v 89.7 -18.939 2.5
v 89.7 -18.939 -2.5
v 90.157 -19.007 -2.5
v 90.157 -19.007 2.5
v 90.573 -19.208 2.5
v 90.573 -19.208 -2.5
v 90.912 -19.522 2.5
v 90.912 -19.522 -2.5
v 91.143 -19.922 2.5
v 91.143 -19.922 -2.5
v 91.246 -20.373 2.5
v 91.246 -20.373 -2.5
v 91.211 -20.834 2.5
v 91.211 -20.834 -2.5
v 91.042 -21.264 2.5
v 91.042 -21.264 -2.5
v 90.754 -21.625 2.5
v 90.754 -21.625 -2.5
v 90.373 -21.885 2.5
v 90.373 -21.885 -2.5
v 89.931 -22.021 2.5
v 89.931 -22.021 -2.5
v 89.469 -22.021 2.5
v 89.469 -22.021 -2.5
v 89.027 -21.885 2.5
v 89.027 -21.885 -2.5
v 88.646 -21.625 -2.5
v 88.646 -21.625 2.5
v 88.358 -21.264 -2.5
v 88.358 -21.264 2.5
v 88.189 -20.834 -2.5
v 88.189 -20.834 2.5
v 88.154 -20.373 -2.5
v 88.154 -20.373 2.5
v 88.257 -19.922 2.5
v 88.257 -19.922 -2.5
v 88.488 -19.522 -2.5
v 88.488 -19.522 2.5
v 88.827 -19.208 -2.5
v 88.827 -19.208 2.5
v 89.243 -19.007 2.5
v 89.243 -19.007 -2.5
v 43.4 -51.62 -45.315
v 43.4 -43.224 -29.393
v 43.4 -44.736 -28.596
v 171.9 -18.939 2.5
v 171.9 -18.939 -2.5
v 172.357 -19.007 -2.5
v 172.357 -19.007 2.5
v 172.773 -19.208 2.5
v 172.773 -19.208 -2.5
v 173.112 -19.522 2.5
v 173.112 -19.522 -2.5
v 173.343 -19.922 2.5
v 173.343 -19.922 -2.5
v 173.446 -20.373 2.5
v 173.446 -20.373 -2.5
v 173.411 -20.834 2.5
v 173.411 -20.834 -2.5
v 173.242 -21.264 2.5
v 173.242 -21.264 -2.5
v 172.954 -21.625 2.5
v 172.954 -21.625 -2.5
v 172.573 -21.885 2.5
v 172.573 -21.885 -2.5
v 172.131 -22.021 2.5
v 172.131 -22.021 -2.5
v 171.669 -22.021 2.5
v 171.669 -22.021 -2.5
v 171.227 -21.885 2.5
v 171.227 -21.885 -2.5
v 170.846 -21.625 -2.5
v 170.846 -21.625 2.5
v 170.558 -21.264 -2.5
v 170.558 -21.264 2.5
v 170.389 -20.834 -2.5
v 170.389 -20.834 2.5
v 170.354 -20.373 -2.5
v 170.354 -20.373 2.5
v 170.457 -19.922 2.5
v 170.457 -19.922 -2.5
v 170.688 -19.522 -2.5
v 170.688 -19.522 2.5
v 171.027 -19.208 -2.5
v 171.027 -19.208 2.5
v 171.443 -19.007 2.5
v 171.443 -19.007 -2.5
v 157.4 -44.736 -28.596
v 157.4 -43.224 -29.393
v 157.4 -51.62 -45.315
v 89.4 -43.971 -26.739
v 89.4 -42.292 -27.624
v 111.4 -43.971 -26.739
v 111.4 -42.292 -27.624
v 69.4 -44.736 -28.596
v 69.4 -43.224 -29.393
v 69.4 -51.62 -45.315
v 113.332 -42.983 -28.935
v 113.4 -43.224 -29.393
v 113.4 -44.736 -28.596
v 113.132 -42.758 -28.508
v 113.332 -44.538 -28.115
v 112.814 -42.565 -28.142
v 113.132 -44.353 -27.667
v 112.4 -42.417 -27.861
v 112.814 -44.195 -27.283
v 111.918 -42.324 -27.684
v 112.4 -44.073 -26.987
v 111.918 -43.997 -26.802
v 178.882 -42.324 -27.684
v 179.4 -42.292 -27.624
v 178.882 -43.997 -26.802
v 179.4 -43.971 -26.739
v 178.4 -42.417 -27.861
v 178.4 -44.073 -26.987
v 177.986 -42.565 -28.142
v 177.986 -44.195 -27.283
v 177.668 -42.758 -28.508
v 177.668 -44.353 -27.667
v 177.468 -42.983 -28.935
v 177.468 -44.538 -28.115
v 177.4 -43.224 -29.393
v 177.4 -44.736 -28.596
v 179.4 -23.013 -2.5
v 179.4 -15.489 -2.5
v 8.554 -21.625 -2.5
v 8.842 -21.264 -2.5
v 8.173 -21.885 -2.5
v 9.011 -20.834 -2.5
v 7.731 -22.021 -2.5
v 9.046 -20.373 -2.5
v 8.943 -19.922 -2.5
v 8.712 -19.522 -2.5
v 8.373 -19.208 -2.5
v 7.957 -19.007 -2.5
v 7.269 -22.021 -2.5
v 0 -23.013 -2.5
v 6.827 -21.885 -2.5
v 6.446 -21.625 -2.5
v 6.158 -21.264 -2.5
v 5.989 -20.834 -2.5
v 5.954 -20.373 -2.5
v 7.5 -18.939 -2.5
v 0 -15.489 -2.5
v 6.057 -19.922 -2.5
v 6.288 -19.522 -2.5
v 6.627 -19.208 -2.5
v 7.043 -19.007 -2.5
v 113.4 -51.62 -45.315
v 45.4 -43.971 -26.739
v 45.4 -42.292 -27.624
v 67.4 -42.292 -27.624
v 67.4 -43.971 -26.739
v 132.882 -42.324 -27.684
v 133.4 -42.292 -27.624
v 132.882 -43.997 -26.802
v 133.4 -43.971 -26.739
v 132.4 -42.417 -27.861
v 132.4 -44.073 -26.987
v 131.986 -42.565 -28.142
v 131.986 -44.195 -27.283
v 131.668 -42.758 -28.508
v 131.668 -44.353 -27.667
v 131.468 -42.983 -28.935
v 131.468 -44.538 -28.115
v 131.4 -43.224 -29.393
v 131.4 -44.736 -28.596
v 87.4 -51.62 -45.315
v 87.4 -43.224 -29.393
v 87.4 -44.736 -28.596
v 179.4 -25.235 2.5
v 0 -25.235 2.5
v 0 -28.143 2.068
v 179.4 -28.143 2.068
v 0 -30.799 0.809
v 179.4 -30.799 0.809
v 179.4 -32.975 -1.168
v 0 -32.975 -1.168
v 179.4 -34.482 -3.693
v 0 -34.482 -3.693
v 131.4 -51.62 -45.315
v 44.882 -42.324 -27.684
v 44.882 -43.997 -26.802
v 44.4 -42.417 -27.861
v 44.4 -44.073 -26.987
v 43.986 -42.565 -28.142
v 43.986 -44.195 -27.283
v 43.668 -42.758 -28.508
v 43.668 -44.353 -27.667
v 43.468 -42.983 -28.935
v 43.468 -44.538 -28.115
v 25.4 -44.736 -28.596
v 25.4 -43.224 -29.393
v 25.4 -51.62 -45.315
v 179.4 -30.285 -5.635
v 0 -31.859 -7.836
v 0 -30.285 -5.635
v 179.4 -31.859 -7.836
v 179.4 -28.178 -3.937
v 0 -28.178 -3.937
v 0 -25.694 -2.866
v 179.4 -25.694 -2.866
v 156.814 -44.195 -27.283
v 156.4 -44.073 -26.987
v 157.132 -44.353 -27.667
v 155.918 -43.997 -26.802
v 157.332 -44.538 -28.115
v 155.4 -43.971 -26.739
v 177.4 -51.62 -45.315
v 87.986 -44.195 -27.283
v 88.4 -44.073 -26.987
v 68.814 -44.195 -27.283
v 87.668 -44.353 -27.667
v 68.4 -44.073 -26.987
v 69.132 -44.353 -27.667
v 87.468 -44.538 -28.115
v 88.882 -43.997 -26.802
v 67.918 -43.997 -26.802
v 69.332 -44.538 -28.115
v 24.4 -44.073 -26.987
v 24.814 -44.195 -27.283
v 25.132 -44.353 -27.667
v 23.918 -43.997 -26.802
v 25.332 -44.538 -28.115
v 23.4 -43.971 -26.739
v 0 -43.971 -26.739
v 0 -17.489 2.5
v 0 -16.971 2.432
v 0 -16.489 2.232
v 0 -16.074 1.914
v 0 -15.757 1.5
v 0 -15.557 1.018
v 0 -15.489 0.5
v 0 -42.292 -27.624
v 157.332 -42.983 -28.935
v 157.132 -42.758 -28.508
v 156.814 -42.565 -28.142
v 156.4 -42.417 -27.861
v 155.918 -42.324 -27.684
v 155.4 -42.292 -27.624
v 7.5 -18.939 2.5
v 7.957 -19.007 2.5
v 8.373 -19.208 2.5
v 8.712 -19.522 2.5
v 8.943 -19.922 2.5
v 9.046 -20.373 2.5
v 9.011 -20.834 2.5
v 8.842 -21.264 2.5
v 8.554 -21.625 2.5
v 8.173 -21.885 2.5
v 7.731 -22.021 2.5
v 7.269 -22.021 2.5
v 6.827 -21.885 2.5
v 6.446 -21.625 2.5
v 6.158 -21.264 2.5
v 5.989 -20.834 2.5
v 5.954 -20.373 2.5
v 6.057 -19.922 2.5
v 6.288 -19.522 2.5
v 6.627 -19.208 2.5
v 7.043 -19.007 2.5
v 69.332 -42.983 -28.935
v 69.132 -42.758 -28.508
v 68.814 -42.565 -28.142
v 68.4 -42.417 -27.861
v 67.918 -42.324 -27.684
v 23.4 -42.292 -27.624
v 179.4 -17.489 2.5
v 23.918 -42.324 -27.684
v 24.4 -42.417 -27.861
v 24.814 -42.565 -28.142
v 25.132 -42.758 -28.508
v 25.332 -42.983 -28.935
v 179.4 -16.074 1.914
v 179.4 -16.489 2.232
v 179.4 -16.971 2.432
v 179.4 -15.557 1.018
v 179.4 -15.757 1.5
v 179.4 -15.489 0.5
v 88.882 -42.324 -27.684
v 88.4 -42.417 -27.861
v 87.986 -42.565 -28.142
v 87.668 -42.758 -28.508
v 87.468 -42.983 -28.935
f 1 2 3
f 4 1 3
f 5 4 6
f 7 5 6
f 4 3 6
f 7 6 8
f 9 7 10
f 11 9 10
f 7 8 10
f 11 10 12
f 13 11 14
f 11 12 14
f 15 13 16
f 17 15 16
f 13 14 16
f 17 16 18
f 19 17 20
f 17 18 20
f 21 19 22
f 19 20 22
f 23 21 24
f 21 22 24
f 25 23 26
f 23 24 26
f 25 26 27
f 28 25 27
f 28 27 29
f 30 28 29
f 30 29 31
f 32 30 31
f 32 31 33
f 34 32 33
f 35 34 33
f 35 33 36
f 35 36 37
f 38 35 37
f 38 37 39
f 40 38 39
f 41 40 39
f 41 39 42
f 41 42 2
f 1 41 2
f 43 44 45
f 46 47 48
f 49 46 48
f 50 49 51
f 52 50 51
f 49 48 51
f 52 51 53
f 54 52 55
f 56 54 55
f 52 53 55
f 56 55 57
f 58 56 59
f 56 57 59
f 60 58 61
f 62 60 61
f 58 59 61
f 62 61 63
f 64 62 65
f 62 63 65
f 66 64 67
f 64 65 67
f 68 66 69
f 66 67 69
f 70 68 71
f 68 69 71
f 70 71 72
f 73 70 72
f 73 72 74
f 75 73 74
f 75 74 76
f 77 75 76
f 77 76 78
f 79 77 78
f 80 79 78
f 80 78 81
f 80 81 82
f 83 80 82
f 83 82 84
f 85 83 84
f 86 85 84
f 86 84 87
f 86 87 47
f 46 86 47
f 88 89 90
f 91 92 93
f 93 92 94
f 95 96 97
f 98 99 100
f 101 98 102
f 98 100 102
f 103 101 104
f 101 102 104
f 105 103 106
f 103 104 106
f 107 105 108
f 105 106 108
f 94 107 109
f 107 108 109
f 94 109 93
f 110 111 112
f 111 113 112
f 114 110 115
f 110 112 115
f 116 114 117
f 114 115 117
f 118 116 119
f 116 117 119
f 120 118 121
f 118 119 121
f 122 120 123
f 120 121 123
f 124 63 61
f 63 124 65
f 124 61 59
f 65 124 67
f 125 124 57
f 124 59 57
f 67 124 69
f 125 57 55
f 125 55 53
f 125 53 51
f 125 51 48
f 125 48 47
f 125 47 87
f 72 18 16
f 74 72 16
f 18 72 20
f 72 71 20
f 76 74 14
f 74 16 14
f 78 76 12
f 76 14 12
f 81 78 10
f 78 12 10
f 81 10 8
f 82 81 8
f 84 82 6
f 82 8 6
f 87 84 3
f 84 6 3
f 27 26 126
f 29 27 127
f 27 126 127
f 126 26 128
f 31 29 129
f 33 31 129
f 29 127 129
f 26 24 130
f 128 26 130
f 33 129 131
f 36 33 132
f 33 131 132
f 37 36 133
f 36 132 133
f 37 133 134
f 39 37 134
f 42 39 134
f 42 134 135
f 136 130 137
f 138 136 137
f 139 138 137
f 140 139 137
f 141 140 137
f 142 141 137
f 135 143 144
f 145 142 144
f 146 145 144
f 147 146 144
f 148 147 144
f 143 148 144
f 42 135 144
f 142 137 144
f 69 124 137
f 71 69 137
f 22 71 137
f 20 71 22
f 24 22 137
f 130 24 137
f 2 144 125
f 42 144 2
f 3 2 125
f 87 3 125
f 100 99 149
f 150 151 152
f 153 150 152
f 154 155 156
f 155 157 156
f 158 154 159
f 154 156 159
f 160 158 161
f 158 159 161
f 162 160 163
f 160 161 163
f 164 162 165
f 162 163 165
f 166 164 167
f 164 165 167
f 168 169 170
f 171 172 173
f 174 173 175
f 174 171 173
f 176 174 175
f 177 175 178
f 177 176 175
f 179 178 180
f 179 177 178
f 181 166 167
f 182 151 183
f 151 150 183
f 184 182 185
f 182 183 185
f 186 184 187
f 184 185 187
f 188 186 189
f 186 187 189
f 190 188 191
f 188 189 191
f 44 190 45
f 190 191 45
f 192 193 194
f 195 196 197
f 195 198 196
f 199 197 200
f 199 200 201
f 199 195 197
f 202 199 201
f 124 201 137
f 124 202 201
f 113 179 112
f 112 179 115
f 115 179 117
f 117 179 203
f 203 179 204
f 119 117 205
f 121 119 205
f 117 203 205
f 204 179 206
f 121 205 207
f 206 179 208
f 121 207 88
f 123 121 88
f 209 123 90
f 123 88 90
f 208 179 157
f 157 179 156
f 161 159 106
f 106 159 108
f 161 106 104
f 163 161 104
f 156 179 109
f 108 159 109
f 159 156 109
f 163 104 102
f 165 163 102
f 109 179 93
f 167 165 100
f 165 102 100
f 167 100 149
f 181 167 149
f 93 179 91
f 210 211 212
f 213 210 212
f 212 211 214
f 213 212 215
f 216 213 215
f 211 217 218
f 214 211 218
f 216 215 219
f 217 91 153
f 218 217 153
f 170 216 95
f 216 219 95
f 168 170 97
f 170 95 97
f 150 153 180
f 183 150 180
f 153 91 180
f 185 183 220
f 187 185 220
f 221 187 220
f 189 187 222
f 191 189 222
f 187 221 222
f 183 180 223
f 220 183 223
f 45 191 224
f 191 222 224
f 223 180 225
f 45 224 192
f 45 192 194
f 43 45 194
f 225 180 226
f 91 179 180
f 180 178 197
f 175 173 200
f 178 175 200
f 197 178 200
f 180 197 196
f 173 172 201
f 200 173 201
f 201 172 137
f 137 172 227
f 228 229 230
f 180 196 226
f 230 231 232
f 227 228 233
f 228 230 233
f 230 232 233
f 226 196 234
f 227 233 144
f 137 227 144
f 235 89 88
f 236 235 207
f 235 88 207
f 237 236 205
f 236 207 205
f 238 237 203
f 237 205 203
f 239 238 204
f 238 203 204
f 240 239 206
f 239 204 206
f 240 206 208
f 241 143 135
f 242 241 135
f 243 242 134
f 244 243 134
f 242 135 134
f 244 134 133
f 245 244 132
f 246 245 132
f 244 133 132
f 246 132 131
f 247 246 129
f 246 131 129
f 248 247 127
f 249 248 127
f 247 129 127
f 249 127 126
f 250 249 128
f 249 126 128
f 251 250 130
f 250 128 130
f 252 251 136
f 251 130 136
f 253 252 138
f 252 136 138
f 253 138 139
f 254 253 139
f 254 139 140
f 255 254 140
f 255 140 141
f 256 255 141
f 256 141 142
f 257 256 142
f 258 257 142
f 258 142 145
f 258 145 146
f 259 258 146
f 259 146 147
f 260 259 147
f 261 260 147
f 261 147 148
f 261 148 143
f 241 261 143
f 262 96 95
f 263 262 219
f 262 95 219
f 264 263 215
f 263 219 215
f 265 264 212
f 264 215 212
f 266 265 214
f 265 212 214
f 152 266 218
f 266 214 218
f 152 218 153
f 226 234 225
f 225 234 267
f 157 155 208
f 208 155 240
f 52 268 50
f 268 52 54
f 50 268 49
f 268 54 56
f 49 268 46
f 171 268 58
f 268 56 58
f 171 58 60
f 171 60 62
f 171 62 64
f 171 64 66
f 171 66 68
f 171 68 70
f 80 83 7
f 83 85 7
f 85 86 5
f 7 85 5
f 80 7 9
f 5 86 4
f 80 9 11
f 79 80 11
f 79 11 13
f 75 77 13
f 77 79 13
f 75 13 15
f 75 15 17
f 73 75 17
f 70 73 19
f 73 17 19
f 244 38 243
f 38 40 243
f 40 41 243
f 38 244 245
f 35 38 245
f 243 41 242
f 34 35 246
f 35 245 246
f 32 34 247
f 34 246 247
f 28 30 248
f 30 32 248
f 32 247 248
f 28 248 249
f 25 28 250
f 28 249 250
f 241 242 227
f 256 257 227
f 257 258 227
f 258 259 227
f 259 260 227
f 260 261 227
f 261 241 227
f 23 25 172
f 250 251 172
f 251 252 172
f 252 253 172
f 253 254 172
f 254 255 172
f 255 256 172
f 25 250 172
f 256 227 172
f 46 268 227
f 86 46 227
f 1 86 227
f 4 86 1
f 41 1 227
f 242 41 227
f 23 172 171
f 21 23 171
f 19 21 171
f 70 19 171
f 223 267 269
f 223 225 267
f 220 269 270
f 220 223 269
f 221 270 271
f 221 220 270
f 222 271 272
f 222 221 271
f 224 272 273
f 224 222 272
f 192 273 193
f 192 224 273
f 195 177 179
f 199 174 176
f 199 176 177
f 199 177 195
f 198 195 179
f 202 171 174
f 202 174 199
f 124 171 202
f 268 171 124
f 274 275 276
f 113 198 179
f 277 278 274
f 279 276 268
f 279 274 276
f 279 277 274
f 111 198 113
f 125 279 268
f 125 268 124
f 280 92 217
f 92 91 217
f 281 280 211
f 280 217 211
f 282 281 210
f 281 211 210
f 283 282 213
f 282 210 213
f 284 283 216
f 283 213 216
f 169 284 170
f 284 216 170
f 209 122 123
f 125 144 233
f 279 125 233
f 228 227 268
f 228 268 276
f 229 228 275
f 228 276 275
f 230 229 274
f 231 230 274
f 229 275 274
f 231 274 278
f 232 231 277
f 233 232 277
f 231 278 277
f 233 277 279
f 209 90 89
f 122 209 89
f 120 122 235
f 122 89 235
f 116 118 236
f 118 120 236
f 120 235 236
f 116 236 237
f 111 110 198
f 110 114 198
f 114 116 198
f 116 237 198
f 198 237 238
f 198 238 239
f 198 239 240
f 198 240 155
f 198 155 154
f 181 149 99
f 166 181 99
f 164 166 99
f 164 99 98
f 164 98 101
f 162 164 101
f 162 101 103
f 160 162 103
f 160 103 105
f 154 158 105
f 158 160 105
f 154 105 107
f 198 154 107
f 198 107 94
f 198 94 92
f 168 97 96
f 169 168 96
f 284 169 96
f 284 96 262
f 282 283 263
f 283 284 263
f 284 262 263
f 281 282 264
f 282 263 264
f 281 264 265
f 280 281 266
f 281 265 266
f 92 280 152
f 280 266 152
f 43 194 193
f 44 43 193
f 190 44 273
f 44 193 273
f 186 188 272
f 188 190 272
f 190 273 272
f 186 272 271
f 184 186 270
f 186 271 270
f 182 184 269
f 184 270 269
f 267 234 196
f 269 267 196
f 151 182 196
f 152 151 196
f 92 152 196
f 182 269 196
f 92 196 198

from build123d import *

# Parameters (mm, degrees)
BOSS_EXTRUDE1_DEPTH = 179.4
FILLET3_R           = 10
CUT_EXTRUDE3_REACH  = 193.526
SKETCH4_R           = 1.55
CUT_EXTRUDE5_REACH  = 192.528
SKETCH7_W           = 26
SKETCH7_H           = 20
SKETCH7_W_2         = 25.4
SKETCH7_W_3         = 2
FILLET6_R           = 2
FILLET7_R           = 2


with BuildPart() as part:
    # Sketch1 → Boss-Extrude1 (new body)
    with BuildSketch(Plane(origin=(0, 0, 0), x_dir=(0, 0, -1), z_dir=(1, 0, 0))):
        Polygon((-2.5, -15.488635846), (-2.5, -31.932011519), (45.315389352, -51.619548933), (2.5, -29.045260173), (2.5, -15.488635846), align=None)
    extrude(amount=BOSS_EXTRUDE1_DEPTH)

    # Fillet3
    fillet3_edges = [part.edges().sort_by_distance(p)[0] for p in [
        (89.7, -29.045260173, -2.5),
        (89.7, -31.932011519, 2.5),
    ]]
    fillet(fillet3_edges, radius=FILLET3_R)

    # Sketch4 → Cut-Extrude3 (cut, up to next)
    with BuildSketch(Plane(origin=(0, 0, -2.5), x_dir=(-1, 0, 0), z_dir=(0, 0, -1)), mode=Mode.PRIVATE) as cut_extrude3_sk1:
        with Locations(Location((-171.9, -20.488635846, 0), (0, 0, 90))):
            Circle(SKETCH4_R)
    cut_extrude3_tool1 = extrude(cut_extrude3_sk1.sketch, amount=-CUT_EXTRUDE3_REACH, mode=Mode.PRIVATE) & part.part
    # Sketch4 → Cut-Extrude3 (cut, up to next)
    with BuildSketch(Plane(origin=(0, 0, -2.5), x_dir=(-1, 0, 0), z_dir=(0, 0, -1)), mode=Mode.PRIVATE) as cut_extrude3_sk2:
        with Locations(Location((-7.5, -20.488635846, 0), (0, 0, 90))):
            Circle(SKETCH4_R)
    cut_extrude3_tool2 = extrude(cut_extrude3_sk2.sketch, amount=-CUT_EXTRUDE3_REACH, mode=Mode.PRIVATE) & part.part
    # Sketch4 → Cut-Extrude3 (cut, up to next)
    with BuildSketch(Plane(origin=(0, 0, -2.5), x_dir=(-1, 0, 0), z_dir=(0, 0, -1)), mode=Mode.PRIVATE) as cut_extrude3_sk3:
        with Locations(Location((-89.7, -20.488635846, 0), (0, 0, 90))):
            Circle(SKETCH4_R)
    cut_extrude3_tool3 = extrude(cut_extrude3_sk3.sketch, amount=-CUT_EXTRUDE3_REACH, mode=Mode.PRIVATE) & part.part
    add(cut_extrude3_tool1.solids().sort_by_distance((171.9, -20.488636, -2.5))[0], mode=Mode.SUBTRACT)
    add(cut_extrude3_tool2.solids().sort_by_distance((7.5, -20.488636, -2.5))[0], mode=Mode.SUBTRACT)
    add(cut_extrude3_tool3.solids().sort_by_distance((89.7, -20.488636, -2.5))[0], mode=Mode.SUBTRACT)

    # Sketch7 → Cut-Extrude5 (cut, up to next)
    with BuildSketch(Plane(origin=(0, -21.695908288, 11.439104164), x_dir=(1, 0, 0), z_dir=(0, 0.8845784624906722, -0.466391406114691)), mode=Mode.PRIVATE) as cut_extrude5_sk1:
        with Locations((144.4, 54.15993145)):
            Rectangle(SKETCH7_W, SKETCH7_H)
    cut_extrude5_tool1 = extrude(cut_extrude5_sk1.sketch, amount=-CUT_EXTRUDE5_REACH, mode=Mode.PRIVATE) & part.part
    # Sketch7 → Cut-Extrude5 (cut, up to next)
    with BuildSketch(Plane(origin=(0, -21.695908288, 11.439104164), x_dir=(1, 0, 0), z_dir=(0, 0.8845784624906722, -0.466391406114691)), mode=Mode.PRIVATE) as cut_extrude5_sk2:
        with Locations((100.4, 54.15993145)):
            Rectangle(SKETCH7_W, SKETCH7_H)
    cut_extrude5_tool2 = extrude(cut_extrude5_sk2.sketch, amount=-CUT_EXTRUDE5_REACH, mode=Mode.PRIVATE) & part.part
    # Sketch7 → Cut-Extrude5 (cut, up to next)
    with BuildSketch(Plane(origin=(0, -21.695908288, 11.439104164), x_dir=(1, 0, 0), z_dir=(0, 0.8845784624906722, -0.466391406114691)), mode=Mode.PRIVATE) as cut_extrude5_sk3:
        with Locations((56.4, 54.15993145)):
            Rectangle(SKETCH7_W, SKETCH7_H)
    cut_extrude5_tool3 = extrude(cut_extrude5_sk3.sketch, amount=-CUT_EXTRUDE5_REACH, mode=Mode.PRIVATE) & part.part
    # Sketch7 → Cut-Extrude5 (cut, up to next)
    with BuildSketch(Plane(origin=(0, -21.695908288, 11.439104164), x_dir=(1, 0, 0), z_dir=(0, 0.8845784624906722, -0.466391406114691)), mode=Mode.PRIVATE) as cut_extrude5_sk4:
        with Locations((12.7, 54.15993145)):
            Rectangle(SKETCH7_W_2, SKETCH7_H)
    cut_extrude5_tool4 = extrude(cut_extrude5_sk4.sketch, amount=-CUT_EXTRUDE5_REACH, mode=Mode.PRIVATE) & part.part
    # Sketch7 → Cut-Extrude5 (cut, up to next)
    with BuildSketch(Plane(origin=(0, -21.695908288, 11.439104164), x_dir=(1, 0, 0), z_dir=(0, 0.8845784624906722, -0.466391406114691)), mode=Mode.PRIVATE) as cut_extrude5_sk5:
        with Locations((178.4, 54.15993145)):
            Rectangle(SKETCH7_W_3, SKETCH7_H)
    cut_extrude5_tool5 = extrude(cut_extrude5_sk5.sketch, amount=-CUT_EXTRUDE5_REACH, mode=Mode.PRIVATE) & part.part
    add(cut_extrude5_tool1.solids().sort_by_distance((144.4, -46.955635, -36.469605))[0], mode=Mode.SUBTRACT)
    add(cut_extrude5_tool2.solids().sort_by_distance((100.4, -46.955635, -36.469605))[0], mode=Mode.SUBTRACT)
    add(cut_extrude5_tool3.solids().sort_by_distance((56.4, -46.955635, -36.469605))[0], mode=Mode.SUBTRACT)
    add(cut_extrude5_tool4.solids().sort_by_distance((12.7, -46.955635, -36.469605))[0], mode=Mode.SUBTRACT)
    add(cut_extrude5_tool5.solids().sort_by_distance((178.4, -46.955635, -36.469605))[0], mode=Mode.SUBTRACT)

    # Fillet6
    fillet6_edges = [part.edges().sort_by_distance(p)[0] for p in [
        (25.4, -43.131220066, -27.181196576),
        (69.4, -43.131220066, -27.181196576),
        (43.4, -43.131220066, -27.181196576),
        (113.4, -43.131220066, -27.181196576),
        (87.4, -43.131220066, -27.181196576),
        (177.4, -43.131220066, -27.181196576),
        (157.4, -43.131220066, -27.181196576),
        (131.4, -43.131220066, -27.181196576),
    ]]
    fillet(fillet6_edges, radius=FILLET6_R - 0.0001)  # a hair under: the kernel refuses the full size

    # Fillet7
    fillet7_edges = [part.edges().sort_by_distance(p)[0] for p in [
        (89.7, -15.488635846, 2.5),
    ]]
    fillet(fillet7_edges, radius=FILLET7_R)


solid = part.part
